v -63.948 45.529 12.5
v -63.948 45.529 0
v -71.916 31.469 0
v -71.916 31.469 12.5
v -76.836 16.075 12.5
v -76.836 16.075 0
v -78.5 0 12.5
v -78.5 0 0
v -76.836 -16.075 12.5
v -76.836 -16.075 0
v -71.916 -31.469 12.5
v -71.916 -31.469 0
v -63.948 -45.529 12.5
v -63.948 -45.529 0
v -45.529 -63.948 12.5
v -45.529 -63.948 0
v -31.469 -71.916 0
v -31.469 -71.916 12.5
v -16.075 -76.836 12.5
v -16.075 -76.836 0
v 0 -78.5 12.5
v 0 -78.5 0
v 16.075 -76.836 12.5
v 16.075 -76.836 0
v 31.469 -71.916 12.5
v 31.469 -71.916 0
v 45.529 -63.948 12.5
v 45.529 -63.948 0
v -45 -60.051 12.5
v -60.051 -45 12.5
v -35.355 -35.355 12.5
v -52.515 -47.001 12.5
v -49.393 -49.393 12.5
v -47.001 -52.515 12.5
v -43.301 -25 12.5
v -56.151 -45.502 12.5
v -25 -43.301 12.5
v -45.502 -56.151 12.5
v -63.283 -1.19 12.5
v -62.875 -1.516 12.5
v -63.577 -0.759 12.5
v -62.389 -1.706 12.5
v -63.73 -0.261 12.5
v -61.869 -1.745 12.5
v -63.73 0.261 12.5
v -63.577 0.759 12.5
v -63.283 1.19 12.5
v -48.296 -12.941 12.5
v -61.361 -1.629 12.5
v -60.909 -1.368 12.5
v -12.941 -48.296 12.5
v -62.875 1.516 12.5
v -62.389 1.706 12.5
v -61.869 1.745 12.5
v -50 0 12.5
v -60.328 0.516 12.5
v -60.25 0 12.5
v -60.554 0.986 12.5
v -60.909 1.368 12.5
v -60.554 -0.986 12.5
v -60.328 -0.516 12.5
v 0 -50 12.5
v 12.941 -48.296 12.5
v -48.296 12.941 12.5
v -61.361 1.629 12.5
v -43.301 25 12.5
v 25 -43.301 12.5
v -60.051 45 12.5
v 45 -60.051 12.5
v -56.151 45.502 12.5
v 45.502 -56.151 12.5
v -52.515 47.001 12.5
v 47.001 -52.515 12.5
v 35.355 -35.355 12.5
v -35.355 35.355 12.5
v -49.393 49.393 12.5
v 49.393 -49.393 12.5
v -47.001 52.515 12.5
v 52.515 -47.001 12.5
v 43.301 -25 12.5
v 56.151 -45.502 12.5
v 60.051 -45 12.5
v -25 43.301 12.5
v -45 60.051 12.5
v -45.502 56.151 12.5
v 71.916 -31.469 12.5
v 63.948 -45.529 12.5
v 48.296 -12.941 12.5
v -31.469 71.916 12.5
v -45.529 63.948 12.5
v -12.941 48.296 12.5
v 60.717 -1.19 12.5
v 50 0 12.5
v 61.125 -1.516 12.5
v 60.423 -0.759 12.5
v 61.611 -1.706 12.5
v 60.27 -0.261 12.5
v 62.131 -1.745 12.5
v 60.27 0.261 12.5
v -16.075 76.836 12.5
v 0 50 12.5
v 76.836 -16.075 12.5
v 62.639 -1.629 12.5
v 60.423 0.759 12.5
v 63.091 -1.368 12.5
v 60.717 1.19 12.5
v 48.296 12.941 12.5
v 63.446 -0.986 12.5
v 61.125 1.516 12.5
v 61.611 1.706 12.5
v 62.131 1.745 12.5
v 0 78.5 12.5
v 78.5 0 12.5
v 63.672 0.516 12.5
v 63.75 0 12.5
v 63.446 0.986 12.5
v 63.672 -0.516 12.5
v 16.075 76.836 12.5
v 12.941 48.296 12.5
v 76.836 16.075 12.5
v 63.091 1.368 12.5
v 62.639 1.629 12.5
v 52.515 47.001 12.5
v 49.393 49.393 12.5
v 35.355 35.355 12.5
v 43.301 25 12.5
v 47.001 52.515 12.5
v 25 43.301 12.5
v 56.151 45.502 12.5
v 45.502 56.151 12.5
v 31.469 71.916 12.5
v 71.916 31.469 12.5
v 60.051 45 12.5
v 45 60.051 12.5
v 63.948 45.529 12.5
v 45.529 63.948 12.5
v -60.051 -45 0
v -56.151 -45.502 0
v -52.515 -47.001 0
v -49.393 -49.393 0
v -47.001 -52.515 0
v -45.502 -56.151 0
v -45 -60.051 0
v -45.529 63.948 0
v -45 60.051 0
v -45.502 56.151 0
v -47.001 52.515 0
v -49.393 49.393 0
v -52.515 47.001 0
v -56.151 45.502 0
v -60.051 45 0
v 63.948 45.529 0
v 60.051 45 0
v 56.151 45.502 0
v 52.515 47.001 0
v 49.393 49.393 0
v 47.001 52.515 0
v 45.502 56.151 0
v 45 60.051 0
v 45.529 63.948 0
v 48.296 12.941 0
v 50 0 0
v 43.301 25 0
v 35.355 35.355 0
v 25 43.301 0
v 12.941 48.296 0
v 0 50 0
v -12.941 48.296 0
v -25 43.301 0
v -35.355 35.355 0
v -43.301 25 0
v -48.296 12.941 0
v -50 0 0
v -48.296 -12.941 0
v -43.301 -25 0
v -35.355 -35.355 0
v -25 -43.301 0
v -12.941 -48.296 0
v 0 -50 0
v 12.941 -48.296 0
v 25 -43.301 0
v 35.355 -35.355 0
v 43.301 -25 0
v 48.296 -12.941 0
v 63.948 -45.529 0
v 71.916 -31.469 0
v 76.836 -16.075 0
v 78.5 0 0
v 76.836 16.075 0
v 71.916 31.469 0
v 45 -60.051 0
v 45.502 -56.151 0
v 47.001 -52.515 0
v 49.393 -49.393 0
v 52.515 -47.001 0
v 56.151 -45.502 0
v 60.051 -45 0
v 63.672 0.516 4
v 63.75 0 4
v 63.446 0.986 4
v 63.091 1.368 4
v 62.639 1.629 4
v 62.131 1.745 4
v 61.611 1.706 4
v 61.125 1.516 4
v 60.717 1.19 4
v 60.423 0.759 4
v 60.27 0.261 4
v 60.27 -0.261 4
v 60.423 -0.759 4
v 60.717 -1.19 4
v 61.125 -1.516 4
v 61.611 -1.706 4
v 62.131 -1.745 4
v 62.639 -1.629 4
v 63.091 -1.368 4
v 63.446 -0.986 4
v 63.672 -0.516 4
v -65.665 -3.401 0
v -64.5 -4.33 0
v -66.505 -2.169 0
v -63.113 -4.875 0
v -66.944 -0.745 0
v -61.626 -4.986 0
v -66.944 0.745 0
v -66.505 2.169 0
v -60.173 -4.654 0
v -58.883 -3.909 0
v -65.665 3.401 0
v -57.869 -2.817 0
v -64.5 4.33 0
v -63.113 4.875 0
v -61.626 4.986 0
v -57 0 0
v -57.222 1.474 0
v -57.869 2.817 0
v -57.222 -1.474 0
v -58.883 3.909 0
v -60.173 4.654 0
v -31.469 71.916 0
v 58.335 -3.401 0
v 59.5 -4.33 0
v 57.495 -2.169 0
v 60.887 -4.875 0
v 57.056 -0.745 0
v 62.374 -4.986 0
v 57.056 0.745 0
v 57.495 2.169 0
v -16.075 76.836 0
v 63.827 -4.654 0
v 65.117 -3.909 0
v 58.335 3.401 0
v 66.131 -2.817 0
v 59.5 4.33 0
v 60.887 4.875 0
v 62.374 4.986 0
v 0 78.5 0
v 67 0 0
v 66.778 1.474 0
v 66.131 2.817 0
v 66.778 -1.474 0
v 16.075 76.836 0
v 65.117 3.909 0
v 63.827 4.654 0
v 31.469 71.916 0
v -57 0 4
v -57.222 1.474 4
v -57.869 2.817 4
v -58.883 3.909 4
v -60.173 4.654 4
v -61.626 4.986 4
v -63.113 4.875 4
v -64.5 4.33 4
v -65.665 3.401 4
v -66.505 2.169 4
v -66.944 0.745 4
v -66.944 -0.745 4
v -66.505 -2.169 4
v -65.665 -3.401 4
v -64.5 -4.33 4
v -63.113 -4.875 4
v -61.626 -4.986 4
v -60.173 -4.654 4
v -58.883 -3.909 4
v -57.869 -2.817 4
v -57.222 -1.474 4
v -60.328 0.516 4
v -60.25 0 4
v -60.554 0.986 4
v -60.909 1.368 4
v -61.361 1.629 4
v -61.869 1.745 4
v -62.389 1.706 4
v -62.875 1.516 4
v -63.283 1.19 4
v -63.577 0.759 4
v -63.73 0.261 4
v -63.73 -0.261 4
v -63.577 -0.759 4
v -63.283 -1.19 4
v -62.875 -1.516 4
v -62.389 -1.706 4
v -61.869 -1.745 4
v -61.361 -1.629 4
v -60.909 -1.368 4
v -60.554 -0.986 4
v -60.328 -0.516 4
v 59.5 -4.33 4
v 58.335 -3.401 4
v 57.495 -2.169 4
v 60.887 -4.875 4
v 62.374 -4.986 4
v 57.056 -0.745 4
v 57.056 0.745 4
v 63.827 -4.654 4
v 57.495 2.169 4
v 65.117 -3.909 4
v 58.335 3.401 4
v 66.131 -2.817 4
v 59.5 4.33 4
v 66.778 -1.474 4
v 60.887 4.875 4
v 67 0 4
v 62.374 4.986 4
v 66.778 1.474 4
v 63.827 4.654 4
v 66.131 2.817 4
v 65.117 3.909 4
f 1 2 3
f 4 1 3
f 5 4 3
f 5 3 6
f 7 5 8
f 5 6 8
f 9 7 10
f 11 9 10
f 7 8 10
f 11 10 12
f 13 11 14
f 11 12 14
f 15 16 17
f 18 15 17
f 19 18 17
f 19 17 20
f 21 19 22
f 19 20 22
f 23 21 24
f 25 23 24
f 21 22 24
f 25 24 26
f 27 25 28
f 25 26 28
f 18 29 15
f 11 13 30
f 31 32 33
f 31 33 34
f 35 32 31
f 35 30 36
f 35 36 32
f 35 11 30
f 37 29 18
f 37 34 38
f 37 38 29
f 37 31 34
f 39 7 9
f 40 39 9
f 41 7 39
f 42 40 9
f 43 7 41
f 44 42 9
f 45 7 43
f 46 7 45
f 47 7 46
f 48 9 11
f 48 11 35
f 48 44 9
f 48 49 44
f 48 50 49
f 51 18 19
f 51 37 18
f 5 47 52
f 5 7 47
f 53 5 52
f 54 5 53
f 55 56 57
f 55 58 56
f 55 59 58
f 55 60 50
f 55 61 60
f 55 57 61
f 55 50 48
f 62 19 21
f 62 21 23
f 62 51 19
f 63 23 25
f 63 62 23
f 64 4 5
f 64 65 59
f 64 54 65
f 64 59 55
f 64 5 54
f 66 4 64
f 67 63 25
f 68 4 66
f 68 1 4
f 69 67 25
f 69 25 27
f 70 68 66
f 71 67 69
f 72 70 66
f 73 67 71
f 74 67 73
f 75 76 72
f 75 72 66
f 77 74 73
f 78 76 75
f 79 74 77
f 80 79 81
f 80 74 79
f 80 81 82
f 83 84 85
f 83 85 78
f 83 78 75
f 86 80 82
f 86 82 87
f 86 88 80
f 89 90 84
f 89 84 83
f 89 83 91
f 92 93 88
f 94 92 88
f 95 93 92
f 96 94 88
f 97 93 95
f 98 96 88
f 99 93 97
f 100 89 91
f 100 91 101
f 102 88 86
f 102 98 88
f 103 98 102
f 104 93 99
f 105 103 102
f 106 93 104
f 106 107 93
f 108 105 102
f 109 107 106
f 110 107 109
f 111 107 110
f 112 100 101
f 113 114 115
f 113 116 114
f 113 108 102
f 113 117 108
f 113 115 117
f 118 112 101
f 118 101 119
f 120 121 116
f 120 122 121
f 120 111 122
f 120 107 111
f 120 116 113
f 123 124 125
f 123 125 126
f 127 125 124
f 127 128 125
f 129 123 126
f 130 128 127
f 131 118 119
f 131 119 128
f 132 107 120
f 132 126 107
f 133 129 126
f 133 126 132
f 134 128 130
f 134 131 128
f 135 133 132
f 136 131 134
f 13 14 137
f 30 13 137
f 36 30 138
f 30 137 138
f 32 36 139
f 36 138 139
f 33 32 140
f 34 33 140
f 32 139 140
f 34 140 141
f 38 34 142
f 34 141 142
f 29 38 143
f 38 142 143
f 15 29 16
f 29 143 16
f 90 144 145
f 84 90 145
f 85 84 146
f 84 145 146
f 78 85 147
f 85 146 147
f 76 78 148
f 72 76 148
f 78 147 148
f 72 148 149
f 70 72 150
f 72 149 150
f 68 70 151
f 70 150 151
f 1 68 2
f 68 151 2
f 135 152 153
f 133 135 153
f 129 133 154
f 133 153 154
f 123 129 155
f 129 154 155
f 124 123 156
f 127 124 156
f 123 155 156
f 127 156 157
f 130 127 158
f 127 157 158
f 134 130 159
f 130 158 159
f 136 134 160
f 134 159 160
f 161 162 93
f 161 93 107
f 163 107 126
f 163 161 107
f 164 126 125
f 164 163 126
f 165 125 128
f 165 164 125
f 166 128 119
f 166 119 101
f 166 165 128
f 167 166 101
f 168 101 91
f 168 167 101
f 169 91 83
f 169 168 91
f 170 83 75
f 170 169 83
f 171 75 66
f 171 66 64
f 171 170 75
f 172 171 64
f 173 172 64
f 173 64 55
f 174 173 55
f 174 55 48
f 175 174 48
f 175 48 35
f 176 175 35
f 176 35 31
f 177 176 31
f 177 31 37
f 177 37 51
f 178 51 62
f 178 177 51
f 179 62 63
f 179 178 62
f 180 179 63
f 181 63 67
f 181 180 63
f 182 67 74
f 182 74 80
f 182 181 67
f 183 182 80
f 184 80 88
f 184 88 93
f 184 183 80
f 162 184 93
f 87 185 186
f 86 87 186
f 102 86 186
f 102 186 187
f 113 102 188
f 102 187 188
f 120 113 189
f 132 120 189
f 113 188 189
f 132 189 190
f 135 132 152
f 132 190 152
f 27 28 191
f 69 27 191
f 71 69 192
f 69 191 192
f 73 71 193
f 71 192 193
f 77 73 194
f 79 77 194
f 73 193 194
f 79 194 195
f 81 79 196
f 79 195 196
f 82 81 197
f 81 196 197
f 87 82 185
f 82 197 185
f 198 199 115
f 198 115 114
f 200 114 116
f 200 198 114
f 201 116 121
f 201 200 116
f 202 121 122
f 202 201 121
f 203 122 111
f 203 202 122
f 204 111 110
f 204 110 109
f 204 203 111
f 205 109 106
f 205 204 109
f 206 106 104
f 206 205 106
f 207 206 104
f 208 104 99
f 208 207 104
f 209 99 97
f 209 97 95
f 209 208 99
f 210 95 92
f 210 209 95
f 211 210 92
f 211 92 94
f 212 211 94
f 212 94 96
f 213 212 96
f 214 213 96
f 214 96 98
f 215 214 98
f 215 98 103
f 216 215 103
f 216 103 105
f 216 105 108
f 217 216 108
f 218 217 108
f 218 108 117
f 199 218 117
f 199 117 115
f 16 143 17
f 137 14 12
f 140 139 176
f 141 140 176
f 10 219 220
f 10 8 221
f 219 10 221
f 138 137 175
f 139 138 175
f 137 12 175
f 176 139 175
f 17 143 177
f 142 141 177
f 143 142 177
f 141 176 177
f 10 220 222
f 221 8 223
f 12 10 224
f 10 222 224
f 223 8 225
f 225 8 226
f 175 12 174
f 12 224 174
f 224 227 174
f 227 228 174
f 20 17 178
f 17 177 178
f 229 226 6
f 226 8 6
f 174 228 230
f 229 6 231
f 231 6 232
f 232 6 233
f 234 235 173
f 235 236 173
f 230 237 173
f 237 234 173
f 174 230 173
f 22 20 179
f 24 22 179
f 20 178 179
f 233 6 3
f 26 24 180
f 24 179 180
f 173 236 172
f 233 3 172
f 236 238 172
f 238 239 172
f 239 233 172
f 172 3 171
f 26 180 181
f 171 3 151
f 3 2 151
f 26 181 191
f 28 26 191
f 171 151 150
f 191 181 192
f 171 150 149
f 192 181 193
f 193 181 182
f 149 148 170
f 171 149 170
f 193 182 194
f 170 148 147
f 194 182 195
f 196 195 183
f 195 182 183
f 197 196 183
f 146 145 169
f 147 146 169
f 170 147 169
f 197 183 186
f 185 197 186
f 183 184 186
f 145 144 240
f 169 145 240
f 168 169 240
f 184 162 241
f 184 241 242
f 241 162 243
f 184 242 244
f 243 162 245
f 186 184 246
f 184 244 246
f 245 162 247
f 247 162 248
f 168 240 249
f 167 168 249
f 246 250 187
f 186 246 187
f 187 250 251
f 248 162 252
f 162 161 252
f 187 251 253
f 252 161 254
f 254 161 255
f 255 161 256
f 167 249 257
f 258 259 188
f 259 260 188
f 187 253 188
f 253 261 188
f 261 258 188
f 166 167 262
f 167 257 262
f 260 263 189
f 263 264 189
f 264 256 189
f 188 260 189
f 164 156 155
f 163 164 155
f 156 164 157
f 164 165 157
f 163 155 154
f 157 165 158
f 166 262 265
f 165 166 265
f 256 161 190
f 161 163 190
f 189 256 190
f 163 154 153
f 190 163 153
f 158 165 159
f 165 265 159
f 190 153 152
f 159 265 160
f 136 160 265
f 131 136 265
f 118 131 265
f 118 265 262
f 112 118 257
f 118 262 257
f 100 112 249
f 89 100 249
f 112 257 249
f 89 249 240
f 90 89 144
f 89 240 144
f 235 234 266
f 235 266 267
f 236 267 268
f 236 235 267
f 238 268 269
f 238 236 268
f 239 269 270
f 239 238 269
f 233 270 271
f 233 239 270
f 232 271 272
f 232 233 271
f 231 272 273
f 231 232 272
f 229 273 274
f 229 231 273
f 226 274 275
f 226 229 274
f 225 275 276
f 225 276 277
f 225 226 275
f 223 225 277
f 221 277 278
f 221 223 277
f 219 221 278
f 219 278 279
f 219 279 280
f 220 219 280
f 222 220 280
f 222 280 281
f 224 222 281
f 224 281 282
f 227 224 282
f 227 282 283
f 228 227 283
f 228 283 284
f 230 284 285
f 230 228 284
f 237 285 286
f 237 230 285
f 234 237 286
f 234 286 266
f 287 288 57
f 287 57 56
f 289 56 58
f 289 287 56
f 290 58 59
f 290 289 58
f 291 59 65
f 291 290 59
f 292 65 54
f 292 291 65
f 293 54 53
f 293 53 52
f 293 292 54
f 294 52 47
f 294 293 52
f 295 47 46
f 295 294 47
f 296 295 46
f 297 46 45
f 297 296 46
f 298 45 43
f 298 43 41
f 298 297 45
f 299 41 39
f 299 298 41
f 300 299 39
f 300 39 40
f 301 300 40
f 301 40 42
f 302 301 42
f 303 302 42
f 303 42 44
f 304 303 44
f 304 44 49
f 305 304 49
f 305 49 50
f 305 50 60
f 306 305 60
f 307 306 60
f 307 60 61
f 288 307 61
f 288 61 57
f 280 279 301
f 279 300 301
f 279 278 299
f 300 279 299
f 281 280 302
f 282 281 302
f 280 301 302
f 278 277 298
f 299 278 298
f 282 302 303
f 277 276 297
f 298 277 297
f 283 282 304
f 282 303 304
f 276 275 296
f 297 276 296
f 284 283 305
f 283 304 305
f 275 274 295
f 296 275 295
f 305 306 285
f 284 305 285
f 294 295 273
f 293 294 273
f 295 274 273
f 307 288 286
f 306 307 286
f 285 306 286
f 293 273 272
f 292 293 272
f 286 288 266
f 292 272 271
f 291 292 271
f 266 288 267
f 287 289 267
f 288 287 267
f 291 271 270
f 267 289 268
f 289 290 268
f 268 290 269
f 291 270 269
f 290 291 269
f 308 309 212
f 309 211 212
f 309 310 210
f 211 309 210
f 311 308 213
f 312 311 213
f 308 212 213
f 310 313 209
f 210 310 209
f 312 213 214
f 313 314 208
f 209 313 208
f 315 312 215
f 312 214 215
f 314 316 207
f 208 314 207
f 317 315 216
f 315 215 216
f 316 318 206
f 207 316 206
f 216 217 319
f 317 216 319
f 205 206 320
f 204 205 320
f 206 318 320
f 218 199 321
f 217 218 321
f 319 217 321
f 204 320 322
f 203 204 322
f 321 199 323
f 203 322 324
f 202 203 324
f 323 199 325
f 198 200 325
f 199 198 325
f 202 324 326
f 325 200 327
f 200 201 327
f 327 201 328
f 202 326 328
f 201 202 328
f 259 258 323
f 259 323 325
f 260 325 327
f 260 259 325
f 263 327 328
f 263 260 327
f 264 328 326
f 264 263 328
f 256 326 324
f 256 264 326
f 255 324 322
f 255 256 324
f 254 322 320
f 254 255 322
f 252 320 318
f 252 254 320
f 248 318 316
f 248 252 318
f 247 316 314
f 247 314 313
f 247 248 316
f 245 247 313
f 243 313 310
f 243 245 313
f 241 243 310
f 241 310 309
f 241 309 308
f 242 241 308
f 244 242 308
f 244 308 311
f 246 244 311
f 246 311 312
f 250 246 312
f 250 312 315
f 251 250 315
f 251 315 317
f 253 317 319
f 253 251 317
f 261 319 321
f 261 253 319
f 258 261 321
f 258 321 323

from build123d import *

# Parameters (mm, degrees)
SKETCH_1_R          = 1.75
SKETCH_1_R_2        = 50
EXTRUDE_1_DEPTH     = 12.5
SKETCH_1_3_R        = 5
SKETCH_1_3_R_2      = 1.75
CUT_EXTRUDE_1_DEPTH = 4


with BuildPart() as part:
    # 草图1 → 凸台-拉伸1 (new body)
    with BuildSketch(Plane.XY):
        with BuildLine():
            ThreePointArc((63.94815926, -45.528924074), (78.5, 0), (63.94815926, 45.528924074))
            ThreePointArc((63.94815926, 45.528924074), (49.393398282, 49.393398282), (45.528924074, 63.94815926))
            ThreePointArc((45.528924074, 63.94815926), (0, 78.5), (-45.528924074, 63.94815926))
            ThreePointArc((-45.528924074, 63.94815926), (-49.393398282, 49.393398282), (-63.94815926, 45.528924074))
            ThreePointArc((-63.94815926, 45.528924074), (-78.5, 0), (-63.94815926, -45.528924074))
            ThreePointArc((-63.94815926, -45.528924074), (-49.393398282, -49.393398282), (-45.528924074, -63.94815926))
            ThreePointArc((-45.528924074, -63.94815926), (0, -78.5), (45.528924074, -63.94815926))
            ThreePointArc((45.528924074, -63.94815926), (49.393398282, -49.393398282), (63.94815926, -45.528924074))
        make_face()
        with Locations((-62, 0)):
            Circle(SKETCH_1_R, mode=Mode.SUBTRACT)
        Circle(SKETCH_1_R_2, mode=Mode.SUBTRACT)
        with Locations((62, 0)):
            Circle(SKETCH_1_R, mode=Mode.SUBTRACT)
    extrude(amount=EXTRUDE_1_DEPTH)

    # 草图1<3> → 切除-拉伸1 (cut)
    # profile 1 of 2: a face of its own
    with BuildSketch(Plane.XY):
        with Locations((-62, 0)):
            Circle(SKETCH_1_3_R)
        with Locations((-62, 0)):
            Circle(SKETCH_1_3_R_2, mode=Mode.SUBTRACT)
    # profile 2 of 2: a face of its own
    with BuildSketch(Plane.XY):
        with Locations((62, 0)):
            Circle(SKETCH_1_3_R)
        with Locations((62, 0)):
            Circle(SKETCH_1_3_R_2, mode=Mode.SUBTRACT)
    extrude(amount=CUT_EXTRUDE_1_DEPTH, mode=Mode.SUBTRACT)


solid = part.part
